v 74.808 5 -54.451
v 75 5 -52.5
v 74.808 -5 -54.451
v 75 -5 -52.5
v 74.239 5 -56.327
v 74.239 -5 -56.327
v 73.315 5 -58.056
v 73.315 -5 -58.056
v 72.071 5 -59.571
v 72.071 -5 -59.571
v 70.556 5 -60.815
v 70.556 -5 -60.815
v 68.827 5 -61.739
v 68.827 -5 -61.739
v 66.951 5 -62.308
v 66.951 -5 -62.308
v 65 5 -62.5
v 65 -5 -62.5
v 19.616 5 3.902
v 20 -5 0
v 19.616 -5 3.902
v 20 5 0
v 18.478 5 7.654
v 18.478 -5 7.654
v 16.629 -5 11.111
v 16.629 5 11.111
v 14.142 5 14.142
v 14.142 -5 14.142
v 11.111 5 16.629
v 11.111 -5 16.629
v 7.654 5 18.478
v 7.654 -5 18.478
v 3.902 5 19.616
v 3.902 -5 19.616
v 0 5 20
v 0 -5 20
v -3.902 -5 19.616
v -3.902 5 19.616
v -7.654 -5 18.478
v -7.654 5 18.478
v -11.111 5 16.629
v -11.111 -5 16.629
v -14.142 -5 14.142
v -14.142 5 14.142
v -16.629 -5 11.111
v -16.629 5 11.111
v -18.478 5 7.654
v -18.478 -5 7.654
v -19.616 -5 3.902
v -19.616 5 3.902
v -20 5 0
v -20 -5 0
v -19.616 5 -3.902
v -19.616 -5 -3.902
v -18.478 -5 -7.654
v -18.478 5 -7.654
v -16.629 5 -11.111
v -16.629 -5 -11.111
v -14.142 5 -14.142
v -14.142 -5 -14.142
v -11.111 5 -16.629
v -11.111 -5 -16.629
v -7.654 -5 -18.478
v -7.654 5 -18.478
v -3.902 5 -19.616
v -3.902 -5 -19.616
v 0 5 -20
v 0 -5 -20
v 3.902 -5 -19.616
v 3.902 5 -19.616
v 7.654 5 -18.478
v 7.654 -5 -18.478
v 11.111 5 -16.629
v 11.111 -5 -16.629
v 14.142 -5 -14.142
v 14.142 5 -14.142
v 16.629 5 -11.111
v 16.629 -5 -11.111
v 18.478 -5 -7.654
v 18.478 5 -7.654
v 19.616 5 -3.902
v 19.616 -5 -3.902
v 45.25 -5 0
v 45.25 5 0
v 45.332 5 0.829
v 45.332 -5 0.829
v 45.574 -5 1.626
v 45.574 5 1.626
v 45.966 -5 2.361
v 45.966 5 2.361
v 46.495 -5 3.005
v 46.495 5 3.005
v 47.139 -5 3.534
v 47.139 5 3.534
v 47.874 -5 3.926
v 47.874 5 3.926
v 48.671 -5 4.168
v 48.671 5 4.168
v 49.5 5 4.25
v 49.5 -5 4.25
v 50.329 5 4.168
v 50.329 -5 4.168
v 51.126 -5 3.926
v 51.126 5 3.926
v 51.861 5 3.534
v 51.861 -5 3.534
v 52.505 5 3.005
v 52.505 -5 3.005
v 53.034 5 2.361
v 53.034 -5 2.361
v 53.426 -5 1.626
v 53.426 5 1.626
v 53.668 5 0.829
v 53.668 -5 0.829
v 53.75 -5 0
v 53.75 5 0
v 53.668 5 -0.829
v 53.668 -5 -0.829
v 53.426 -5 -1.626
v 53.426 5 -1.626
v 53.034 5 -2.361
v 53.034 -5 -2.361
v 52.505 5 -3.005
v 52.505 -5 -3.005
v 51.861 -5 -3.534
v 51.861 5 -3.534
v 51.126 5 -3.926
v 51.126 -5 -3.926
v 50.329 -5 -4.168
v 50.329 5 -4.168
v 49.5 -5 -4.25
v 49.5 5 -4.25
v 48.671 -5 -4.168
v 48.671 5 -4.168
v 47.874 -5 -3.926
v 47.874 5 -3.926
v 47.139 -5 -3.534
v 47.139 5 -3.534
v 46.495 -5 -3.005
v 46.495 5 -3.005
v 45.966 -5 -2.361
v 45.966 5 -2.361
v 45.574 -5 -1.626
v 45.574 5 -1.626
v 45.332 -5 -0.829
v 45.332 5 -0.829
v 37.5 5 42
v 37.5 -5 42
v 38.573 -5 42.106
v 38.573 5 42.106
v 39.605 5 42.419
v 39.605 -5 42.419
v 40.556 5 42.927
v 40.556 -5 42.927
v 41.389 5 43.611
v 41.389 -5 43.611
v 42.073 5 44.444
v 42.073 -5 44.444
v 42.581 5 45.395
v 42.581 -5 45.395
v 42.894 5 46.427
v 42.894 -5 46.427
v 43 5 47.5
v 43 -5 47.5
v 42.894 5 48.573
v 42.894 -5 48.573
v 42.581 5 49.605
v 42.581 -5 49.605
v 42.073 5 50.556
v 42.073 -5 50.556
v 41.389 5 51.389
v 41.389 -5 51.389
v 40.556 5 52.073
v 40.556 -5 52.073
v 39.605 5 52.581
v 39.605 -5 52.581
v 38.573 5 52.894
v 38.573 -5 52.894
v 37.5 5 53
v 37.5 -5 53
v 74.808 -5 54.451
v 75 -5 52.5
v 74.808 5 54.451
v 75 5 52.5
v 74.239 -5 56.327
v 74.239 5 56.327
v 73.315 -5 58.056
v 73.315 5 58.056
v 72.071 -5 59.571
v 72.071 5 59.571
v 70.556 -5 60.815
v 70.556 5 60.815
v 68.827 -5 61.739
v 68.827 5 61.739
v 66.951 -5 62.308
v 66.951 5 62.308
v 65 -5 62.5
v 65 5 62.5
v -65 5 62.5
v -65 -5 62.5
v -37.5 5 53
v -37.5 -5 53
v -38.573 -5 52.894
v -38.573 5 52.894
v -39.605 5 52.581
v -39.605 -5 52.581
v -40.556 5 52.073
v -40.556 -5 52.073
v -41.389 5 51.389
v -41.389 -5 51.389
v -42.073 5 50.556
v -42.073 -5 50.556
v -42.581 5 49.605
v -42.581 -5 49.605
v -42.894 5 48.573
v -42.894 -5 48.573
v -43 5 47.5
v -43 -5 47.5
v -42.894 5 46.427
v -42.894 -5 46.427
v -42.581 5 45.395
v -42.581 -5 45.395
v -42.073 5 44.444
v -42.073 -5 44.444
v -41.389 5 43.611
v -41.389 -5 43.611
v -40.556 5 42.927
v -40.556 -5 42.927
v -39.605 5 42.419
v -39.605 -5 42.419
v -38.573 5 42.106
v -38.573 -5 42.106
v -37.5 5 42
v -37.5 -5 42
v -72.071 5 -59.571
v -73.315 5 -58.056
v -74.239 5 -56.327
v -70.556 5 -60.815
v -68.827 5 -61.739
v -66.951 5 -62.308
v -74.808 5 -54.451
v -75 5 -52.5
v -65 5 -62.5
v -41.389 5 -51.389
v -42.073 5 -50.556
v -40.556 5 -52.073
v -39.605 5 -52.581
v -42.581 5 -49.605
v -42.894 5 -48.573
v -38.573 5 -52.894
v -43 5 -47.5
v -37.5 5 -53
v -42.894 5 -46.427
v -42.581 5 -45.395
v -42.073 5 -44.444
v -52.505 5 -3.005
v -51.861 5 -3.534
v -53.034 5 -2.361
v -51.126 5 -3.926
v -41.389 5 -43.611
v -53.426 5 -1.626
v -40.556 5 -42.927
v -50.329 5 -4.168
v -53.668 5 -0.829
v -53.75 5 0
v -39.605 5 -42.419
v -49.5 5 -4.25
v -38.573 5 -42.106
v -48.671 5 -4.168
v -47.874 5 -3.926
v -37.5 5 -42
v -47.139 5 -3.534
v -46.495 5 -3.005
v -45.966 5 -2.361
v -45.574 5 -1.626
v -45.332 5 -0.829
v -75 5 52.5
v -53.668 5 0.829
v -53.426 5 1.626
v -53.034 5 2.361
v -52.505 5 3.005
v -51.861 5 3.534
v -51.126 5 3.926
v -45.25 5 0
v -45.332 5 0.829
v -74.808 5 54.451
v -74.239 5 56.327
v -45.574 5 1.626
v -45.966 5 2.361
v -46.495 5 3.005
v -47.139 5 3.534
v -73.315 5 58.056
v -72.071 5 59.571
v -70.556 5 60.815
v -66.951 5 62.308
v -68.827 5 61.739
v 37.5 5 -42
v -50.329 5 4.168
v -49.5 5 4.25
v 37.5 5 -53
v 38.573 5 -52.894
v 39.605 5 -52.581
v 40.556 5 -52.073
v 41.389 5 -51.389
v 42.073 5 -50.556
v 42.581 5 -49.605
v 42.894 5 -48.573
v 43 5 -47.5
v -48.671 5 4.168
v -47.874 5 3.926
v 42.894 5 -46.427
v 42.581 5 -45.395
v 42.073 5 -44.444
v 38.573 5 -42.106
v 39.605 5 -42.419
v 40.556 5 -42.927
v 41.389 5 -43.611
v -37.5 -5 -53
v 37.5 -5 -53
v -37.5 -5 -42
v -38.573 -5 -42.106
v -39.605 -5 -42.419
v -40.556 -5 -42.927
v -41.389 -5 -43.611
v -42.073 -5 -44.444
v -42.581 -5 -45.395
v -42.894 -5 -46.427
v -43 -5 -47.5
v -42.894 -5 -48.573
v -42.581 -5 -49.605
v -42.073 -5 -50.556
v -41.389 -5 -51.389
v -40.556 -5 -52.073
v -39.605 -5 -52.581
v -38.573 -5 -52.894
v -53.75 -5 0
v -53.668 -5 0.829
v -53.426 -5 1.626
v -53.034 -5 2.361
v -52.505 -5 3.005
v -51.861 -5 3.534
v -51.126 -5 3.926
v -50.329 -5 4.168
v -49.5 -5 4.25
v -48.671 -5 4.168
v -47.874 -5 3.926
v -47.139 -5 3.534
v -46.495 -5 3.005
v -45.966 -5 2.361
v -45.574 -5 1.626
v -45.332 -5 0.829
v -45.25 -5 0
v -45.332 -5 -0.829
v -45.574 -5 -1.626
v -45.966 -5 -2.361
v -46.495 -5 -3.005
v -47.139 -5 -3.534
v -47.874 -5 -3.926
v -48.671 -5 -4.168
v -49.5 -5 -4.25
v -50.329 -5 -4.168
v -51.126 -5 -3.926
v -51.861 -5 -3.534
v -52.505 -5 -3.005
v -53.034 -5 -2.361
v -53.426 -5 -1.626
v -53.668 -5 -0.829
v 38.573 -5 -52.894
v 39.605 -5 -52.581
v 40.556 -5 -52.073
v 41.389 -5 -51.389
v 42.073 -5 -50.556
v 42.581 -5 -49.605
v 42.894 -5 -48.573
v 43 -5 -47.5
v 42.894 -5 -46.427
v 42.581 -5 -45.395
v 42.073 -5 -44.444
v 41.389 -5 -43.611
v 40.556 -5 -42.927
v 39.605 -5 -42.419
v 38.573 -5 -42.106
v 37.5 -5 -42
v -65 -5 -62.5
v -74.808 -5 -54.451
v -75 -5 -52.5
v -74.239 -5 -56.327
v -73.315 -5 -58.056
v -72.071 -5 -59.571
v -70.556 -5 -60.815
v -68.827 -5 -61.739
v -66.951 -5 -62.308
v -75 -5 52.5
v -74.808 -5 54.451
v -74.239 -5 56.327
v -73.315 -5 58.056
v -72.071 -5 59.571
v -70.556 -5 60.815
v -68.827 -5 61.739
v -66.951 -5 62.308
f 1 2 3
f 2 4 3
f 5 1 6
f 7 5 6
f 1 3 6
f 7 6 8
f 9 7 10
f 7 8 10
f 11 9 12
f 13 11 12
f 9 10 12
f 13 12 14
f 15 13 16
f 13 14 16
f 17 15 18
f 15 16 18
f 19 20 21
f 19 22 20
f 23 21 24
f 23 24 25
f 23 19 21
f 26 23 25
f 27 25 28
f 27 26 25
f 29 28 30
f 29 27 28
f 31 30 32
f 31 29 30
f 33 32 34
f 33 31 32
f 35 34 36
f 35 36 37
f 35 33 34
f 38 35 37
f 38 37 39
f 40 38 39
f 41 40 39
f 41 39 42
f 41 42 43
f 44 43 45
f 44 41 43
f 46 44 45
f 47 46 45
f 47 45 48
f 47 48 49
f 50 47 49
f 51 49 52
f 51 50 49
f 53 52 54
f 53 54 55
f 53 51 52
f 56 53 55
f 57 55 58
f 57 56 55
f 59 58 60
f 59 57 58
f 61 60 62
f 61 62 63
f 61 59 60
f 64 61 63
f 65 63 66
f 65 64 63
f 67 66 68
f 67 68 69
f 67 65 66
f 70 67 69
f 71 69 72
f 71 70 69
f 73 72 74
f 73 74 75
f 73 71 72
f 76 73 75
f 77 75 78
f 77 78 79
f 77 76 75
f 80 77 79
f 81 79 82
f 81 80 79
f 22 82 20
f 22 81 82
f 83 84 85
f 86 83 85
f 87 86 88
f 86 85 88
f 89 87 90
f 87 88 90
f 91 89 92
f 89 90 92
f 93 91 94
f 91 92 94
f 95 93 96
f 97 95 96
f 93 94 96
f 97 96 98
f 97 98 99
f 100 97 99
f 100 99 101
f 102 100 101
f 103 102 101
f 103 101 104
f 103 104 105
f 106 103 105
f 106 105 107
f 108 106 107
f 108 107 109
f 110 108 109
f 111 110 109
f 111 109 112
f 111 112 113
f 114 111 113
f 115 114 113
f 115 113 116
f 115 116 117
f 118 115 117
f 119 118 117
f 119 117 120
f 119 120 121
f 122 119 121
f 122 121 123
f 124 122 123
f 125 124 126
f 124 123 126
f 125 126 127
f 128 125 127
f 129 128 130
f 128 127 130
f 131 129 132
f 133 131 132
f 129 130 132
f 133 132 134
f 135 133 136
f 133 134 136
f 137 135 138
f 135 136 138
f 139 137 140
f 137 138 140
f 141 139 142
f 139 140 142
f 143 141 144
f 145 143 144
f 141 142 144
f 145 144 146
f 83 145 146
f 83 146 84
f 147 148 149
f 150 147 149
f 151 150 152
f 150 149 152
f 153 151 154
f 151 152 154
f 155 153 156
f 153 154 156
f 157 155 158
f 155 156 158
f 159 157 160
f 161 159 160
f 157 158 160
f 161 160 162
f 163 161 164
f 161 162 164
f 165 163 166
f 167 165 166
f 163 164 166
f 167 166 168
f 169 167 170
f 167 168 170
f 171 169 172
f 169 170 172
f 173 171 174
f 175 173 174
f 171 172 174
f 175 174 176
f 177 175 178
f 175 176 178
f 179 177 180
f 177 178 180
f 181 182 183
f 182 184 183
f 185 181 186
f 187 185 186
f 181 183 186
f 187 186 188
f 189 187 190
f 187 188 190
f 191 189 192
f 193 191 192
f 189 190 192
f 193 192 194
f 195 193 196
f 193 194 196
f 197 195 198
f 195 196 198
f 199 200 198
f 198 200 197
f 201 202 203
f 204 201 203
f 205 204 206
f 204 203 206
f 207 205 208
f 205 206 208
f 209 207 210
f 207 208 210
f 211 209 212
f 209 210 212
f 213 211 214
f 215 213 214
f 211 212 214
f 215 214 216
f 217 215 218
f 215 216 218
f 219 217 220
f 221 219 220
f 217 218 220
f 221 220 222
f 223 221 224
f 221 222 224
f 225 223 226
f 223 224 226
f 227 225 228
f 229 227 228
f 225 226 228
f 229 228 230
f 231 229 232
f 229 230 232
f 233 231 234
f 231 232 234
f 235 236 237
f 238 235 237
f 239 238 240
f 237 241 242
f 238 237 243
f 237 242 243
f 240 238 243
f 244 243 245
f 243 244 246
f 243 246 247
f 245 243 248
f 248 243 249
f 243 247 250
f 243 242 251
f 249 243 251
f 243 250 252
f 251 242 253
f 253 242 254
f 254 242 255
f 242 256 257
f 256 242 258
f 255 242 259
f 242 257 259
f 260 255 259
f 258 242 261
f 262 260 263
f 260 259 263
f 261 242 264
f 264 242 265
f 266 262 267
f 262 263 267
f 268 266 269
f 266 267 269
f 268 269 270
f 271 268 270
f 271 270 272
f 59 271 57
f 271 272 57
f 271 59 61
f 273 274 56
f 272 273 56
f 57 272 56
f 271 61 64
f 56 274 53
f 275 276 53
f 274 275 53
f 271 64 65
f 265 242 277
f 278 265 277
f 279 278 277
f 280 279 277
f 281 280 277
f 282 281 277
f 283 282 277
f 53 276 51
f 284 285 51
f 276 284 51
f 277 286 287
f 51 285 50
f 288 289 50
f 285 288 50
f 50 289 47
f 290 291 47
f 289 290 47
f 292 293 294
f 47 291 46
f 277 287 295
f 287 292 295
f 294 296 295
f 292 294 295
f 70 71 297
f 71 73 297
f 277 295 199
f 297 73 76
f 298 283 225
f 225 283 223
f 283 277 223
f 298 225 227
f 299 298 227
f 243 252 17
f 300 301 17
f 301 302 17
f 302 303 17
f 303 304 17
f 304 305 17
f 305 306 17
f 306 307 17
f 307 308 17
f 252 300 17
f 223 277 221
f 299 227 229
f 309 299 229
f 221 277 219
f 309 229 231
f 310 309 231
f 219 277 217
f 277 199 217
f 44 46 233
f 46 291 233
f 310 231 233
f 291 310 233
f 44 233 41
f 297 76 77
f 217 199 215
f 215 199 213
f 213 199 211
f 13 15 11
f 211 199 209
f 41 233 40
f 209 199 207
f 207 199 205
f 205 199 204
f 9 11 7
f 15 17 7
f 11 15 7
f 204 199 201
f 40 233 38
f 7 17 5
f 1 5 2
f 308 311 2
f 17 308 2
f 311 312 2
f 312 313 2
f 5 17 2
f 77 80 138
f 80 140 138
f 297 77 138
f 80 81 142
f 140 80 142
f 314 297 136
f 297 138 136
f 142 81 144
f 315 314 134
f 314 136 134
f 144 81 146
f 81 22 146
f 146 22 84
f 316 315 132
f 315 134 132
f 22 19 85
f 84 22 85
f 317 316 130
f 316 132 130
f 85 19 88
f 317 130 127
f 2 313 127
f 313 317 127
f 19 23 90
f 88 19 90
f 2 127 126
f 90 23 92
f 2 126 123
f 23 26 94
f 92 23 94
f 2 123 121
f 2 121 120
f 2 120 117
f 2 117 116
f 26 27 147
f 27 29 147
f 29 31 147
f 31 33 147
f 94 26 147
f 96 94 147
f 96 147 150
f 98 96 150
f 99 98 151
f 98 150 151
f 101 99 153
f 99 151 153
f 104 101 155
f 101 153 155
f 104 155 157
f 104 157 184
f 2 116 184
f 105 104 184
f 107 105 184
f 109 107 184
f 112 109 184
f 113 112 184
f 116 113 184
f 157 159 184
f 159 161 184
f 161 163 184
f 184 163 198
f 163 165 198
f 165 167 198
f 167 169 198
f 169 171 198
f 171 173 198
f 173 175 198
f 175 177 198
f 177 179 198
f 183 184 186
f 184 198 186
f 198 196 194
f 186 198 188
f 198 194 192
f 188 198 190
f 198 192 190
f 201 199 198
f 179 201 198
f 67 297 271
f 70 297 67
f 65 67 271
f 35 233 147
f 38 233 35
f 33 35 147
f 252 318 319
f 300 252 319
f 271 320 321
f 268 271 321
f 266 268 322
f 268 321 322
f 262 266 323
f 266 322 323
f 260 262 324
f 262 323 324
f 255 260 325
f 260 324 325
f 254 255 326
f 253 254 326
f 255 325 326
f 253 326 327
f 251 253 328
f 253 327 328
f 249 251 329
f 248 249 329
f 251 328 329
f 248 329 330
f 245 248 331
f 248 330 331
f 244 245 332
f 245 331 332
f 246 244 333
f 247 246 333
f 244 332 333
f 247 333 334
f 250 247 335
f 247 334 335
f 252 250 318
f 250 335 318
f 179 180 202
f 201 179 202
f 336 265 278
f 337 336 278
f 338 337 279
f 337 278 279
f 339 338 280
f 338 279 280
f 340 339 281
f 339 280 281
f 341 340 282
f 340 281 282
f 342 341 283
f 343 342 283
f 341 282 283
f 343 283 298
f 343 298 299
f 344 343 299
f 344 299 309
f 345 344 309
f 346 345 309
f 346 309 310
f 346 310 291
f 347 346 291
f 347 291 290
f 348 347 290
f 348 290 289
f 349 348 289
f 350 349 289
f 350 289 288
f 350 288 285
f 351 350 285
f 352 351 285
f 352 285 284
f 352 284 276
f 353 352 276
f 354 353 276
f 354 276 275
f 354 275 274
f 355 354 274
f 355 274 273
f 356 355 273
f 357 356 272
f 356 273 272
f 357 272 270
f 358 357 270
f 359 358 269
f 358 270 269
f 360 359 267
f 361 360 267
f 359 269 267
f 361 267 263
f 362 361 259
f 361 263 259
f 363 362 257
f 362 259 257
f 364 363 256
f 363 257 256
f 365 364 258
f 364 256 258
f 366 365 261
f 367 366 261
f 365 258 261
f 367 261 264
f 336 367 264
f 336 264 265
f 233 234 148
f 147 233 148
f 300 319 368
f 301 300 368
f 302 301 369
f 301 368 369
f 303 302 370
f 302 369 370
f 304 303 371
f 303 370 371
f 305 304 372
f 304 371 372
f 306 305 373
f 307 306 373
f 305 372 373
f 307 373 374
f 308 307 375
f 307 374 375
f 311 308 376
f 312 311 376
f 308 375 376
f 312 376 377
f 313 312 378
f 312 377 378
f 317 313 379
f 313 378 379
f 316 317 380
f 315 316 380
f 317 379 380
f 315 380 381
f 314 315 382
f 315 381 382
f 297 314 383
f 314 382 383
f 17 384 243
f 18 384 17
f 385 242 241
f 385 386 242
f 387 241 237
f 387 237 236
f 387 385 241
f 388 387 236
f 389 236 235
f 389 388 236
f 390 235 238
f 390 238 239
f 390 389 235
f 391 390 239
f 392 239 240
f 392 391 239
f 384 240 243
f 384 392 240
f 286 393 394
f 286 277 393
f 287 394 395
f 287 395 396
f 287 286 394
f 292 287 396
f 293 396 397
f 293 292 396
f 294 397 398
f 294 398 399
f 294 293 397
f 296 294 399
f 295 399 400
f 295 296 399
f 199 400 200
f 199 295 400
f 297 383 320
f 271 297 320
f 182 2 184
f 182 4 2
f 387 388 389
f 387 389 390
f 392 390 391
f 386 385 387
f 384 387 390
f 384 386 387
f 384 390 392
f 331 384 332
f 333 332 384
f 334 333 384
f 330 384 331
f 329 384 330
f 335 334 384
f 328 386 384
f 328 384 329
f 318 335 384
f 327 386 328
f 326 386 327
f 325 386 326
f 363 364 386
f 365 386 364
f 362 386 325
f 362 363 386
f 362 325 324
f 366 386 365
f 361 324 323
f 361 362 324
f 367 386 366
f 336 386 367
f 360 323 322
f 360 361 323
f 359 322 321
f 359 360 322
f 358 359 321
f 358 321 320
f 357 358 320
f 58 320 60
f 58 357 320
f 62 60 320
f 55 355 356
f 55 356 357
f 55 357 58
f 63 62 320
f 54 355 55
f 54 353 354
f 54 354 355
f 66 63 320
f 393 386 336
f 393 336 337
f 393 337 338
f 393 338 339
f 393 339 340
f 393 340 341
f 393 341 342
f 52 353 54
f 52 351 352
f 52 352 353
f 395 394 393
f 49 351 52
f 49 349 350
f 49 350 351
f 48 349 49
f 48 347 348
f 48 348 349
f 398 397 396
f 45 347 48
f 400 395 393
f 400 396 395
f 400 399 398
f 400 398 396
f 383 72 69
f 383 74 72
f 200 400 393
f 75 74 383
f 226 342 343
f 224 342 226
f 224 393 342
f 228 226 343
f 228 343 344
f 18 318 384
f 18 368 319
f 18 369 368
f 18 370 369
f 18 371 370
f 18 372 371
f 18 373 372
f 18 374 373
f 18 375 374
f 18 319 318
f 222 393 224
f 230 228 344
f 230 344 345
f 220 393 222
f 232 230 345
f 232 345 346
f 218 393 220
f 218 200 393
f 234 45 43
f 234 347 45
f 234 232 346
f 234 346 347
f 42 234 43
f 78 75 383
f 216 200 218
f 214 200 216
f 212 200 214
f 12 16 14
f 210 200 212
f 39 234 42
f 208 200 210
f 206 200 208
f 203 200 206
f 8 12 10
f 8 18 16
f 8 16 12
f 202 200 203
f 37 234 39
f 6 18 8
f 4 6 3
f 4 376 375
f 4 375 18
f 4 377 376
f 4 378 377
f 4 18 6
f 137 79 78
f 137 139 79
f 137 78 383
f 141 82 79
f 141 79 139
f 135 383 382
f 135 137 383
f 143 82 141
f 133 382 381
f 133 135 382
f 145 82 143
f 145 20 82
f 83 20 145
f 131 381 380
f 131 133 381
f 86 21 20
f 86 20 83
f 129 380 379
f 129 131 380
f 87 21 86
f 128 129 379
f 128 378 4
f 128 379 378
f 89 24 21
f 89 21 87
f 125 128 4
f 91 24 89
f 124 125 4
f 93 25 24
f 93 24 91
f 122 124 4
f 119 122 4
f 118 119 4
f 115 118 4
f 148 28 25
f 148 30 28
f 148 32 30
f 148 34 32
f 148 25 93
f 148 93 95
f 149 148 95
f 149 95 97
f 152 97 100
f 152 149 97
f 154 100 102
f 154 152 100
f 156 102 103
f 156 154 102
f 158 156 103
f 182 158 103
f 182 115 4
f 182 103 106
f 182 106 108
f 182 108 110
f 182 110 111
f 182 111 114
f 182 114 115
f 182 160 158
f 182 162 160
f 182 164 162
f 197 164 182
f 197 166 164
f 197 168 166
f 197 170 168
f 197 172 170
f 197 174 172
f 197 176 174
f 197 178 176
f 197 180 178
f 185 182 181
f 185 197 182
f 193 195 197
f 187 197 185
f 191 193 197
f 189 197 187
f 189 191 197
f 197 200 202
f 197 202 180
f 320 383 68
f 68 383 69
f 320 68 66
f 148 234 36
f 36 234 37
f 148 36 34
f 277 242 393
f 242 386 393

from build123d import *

# Parameters (mm, degrees)
F0_W     = 150
F0_H     = 125
F0_R     = 20
F1_DEPTH = 5
F2_R     = 10
F4_D     = 8.5
F4_DEPTH = 24.5
F4_TIP   = 2.5536576309
F6_DEPTH = 10.001


with BuildPart() as f1:
    # F0 (on Front) → F1 (new body, symmetric)
    with BuildSketch(Plane.XZ):
        Rectangle(F0_W, F0_H)
        Circle(F0_R, mode=Mode.SUBTRACT)
    extrude(amount=F1_DEPTH, both=True)

    # F2
    f2_edges = [f1.edges().sort_by_distance(p)[0] for p in [
        (-75, 0, 62.5),
        (75, 0, 62.5),
        (75, 0, -62.5),
        (-75, 0, -62.5),
    ]]
    fillet(f2_edges, radius=F2_R)

    # F4
    with Locations(Plane.XZ.offset(5)):
        with Locations((-49.5, 0), (49.5, 0)):
            Hole(F4_D / 2, depth=F4_DEPTH)
            with Locations((0, 0, -(F4_DEPTH + F4_TIP / 2))):  # 118° drill point
                Cone(0, F4_D / 2, F4_TIP, mode=Mode.SUBTRACT)

    # F5 (on face) → F6 (cut, through all)
    with BuildSketch(Plane.XZ.offset(5)):
        with BuildLine():
            ThreePointArc((-37.5, 53), (-43, 47.5), (-37.5, 42))
            Line((-37.5, 42), (37.5, 42))
            ThreePointArc((37.5, 42), (43, 47.5), (37.5, 53))
            Line((37.5, 53), (-37.5, 53))
        make_face()
        with BuildLine():
            ThreePointArc((37.5, -53), (43, -47.5), (37.5, -42))
            Line((37.5, -42), (-37.5, -42))
            ThreePointArc((-37.5, -42), (-43, -47.5), (-37.5, -53))
            Line((-37.5, -53), (37.5, -53))
        make_face()
    extrude(amount=-F6_DEPTH, mode=Mode.SUBTRACT)


solid = f1.part
